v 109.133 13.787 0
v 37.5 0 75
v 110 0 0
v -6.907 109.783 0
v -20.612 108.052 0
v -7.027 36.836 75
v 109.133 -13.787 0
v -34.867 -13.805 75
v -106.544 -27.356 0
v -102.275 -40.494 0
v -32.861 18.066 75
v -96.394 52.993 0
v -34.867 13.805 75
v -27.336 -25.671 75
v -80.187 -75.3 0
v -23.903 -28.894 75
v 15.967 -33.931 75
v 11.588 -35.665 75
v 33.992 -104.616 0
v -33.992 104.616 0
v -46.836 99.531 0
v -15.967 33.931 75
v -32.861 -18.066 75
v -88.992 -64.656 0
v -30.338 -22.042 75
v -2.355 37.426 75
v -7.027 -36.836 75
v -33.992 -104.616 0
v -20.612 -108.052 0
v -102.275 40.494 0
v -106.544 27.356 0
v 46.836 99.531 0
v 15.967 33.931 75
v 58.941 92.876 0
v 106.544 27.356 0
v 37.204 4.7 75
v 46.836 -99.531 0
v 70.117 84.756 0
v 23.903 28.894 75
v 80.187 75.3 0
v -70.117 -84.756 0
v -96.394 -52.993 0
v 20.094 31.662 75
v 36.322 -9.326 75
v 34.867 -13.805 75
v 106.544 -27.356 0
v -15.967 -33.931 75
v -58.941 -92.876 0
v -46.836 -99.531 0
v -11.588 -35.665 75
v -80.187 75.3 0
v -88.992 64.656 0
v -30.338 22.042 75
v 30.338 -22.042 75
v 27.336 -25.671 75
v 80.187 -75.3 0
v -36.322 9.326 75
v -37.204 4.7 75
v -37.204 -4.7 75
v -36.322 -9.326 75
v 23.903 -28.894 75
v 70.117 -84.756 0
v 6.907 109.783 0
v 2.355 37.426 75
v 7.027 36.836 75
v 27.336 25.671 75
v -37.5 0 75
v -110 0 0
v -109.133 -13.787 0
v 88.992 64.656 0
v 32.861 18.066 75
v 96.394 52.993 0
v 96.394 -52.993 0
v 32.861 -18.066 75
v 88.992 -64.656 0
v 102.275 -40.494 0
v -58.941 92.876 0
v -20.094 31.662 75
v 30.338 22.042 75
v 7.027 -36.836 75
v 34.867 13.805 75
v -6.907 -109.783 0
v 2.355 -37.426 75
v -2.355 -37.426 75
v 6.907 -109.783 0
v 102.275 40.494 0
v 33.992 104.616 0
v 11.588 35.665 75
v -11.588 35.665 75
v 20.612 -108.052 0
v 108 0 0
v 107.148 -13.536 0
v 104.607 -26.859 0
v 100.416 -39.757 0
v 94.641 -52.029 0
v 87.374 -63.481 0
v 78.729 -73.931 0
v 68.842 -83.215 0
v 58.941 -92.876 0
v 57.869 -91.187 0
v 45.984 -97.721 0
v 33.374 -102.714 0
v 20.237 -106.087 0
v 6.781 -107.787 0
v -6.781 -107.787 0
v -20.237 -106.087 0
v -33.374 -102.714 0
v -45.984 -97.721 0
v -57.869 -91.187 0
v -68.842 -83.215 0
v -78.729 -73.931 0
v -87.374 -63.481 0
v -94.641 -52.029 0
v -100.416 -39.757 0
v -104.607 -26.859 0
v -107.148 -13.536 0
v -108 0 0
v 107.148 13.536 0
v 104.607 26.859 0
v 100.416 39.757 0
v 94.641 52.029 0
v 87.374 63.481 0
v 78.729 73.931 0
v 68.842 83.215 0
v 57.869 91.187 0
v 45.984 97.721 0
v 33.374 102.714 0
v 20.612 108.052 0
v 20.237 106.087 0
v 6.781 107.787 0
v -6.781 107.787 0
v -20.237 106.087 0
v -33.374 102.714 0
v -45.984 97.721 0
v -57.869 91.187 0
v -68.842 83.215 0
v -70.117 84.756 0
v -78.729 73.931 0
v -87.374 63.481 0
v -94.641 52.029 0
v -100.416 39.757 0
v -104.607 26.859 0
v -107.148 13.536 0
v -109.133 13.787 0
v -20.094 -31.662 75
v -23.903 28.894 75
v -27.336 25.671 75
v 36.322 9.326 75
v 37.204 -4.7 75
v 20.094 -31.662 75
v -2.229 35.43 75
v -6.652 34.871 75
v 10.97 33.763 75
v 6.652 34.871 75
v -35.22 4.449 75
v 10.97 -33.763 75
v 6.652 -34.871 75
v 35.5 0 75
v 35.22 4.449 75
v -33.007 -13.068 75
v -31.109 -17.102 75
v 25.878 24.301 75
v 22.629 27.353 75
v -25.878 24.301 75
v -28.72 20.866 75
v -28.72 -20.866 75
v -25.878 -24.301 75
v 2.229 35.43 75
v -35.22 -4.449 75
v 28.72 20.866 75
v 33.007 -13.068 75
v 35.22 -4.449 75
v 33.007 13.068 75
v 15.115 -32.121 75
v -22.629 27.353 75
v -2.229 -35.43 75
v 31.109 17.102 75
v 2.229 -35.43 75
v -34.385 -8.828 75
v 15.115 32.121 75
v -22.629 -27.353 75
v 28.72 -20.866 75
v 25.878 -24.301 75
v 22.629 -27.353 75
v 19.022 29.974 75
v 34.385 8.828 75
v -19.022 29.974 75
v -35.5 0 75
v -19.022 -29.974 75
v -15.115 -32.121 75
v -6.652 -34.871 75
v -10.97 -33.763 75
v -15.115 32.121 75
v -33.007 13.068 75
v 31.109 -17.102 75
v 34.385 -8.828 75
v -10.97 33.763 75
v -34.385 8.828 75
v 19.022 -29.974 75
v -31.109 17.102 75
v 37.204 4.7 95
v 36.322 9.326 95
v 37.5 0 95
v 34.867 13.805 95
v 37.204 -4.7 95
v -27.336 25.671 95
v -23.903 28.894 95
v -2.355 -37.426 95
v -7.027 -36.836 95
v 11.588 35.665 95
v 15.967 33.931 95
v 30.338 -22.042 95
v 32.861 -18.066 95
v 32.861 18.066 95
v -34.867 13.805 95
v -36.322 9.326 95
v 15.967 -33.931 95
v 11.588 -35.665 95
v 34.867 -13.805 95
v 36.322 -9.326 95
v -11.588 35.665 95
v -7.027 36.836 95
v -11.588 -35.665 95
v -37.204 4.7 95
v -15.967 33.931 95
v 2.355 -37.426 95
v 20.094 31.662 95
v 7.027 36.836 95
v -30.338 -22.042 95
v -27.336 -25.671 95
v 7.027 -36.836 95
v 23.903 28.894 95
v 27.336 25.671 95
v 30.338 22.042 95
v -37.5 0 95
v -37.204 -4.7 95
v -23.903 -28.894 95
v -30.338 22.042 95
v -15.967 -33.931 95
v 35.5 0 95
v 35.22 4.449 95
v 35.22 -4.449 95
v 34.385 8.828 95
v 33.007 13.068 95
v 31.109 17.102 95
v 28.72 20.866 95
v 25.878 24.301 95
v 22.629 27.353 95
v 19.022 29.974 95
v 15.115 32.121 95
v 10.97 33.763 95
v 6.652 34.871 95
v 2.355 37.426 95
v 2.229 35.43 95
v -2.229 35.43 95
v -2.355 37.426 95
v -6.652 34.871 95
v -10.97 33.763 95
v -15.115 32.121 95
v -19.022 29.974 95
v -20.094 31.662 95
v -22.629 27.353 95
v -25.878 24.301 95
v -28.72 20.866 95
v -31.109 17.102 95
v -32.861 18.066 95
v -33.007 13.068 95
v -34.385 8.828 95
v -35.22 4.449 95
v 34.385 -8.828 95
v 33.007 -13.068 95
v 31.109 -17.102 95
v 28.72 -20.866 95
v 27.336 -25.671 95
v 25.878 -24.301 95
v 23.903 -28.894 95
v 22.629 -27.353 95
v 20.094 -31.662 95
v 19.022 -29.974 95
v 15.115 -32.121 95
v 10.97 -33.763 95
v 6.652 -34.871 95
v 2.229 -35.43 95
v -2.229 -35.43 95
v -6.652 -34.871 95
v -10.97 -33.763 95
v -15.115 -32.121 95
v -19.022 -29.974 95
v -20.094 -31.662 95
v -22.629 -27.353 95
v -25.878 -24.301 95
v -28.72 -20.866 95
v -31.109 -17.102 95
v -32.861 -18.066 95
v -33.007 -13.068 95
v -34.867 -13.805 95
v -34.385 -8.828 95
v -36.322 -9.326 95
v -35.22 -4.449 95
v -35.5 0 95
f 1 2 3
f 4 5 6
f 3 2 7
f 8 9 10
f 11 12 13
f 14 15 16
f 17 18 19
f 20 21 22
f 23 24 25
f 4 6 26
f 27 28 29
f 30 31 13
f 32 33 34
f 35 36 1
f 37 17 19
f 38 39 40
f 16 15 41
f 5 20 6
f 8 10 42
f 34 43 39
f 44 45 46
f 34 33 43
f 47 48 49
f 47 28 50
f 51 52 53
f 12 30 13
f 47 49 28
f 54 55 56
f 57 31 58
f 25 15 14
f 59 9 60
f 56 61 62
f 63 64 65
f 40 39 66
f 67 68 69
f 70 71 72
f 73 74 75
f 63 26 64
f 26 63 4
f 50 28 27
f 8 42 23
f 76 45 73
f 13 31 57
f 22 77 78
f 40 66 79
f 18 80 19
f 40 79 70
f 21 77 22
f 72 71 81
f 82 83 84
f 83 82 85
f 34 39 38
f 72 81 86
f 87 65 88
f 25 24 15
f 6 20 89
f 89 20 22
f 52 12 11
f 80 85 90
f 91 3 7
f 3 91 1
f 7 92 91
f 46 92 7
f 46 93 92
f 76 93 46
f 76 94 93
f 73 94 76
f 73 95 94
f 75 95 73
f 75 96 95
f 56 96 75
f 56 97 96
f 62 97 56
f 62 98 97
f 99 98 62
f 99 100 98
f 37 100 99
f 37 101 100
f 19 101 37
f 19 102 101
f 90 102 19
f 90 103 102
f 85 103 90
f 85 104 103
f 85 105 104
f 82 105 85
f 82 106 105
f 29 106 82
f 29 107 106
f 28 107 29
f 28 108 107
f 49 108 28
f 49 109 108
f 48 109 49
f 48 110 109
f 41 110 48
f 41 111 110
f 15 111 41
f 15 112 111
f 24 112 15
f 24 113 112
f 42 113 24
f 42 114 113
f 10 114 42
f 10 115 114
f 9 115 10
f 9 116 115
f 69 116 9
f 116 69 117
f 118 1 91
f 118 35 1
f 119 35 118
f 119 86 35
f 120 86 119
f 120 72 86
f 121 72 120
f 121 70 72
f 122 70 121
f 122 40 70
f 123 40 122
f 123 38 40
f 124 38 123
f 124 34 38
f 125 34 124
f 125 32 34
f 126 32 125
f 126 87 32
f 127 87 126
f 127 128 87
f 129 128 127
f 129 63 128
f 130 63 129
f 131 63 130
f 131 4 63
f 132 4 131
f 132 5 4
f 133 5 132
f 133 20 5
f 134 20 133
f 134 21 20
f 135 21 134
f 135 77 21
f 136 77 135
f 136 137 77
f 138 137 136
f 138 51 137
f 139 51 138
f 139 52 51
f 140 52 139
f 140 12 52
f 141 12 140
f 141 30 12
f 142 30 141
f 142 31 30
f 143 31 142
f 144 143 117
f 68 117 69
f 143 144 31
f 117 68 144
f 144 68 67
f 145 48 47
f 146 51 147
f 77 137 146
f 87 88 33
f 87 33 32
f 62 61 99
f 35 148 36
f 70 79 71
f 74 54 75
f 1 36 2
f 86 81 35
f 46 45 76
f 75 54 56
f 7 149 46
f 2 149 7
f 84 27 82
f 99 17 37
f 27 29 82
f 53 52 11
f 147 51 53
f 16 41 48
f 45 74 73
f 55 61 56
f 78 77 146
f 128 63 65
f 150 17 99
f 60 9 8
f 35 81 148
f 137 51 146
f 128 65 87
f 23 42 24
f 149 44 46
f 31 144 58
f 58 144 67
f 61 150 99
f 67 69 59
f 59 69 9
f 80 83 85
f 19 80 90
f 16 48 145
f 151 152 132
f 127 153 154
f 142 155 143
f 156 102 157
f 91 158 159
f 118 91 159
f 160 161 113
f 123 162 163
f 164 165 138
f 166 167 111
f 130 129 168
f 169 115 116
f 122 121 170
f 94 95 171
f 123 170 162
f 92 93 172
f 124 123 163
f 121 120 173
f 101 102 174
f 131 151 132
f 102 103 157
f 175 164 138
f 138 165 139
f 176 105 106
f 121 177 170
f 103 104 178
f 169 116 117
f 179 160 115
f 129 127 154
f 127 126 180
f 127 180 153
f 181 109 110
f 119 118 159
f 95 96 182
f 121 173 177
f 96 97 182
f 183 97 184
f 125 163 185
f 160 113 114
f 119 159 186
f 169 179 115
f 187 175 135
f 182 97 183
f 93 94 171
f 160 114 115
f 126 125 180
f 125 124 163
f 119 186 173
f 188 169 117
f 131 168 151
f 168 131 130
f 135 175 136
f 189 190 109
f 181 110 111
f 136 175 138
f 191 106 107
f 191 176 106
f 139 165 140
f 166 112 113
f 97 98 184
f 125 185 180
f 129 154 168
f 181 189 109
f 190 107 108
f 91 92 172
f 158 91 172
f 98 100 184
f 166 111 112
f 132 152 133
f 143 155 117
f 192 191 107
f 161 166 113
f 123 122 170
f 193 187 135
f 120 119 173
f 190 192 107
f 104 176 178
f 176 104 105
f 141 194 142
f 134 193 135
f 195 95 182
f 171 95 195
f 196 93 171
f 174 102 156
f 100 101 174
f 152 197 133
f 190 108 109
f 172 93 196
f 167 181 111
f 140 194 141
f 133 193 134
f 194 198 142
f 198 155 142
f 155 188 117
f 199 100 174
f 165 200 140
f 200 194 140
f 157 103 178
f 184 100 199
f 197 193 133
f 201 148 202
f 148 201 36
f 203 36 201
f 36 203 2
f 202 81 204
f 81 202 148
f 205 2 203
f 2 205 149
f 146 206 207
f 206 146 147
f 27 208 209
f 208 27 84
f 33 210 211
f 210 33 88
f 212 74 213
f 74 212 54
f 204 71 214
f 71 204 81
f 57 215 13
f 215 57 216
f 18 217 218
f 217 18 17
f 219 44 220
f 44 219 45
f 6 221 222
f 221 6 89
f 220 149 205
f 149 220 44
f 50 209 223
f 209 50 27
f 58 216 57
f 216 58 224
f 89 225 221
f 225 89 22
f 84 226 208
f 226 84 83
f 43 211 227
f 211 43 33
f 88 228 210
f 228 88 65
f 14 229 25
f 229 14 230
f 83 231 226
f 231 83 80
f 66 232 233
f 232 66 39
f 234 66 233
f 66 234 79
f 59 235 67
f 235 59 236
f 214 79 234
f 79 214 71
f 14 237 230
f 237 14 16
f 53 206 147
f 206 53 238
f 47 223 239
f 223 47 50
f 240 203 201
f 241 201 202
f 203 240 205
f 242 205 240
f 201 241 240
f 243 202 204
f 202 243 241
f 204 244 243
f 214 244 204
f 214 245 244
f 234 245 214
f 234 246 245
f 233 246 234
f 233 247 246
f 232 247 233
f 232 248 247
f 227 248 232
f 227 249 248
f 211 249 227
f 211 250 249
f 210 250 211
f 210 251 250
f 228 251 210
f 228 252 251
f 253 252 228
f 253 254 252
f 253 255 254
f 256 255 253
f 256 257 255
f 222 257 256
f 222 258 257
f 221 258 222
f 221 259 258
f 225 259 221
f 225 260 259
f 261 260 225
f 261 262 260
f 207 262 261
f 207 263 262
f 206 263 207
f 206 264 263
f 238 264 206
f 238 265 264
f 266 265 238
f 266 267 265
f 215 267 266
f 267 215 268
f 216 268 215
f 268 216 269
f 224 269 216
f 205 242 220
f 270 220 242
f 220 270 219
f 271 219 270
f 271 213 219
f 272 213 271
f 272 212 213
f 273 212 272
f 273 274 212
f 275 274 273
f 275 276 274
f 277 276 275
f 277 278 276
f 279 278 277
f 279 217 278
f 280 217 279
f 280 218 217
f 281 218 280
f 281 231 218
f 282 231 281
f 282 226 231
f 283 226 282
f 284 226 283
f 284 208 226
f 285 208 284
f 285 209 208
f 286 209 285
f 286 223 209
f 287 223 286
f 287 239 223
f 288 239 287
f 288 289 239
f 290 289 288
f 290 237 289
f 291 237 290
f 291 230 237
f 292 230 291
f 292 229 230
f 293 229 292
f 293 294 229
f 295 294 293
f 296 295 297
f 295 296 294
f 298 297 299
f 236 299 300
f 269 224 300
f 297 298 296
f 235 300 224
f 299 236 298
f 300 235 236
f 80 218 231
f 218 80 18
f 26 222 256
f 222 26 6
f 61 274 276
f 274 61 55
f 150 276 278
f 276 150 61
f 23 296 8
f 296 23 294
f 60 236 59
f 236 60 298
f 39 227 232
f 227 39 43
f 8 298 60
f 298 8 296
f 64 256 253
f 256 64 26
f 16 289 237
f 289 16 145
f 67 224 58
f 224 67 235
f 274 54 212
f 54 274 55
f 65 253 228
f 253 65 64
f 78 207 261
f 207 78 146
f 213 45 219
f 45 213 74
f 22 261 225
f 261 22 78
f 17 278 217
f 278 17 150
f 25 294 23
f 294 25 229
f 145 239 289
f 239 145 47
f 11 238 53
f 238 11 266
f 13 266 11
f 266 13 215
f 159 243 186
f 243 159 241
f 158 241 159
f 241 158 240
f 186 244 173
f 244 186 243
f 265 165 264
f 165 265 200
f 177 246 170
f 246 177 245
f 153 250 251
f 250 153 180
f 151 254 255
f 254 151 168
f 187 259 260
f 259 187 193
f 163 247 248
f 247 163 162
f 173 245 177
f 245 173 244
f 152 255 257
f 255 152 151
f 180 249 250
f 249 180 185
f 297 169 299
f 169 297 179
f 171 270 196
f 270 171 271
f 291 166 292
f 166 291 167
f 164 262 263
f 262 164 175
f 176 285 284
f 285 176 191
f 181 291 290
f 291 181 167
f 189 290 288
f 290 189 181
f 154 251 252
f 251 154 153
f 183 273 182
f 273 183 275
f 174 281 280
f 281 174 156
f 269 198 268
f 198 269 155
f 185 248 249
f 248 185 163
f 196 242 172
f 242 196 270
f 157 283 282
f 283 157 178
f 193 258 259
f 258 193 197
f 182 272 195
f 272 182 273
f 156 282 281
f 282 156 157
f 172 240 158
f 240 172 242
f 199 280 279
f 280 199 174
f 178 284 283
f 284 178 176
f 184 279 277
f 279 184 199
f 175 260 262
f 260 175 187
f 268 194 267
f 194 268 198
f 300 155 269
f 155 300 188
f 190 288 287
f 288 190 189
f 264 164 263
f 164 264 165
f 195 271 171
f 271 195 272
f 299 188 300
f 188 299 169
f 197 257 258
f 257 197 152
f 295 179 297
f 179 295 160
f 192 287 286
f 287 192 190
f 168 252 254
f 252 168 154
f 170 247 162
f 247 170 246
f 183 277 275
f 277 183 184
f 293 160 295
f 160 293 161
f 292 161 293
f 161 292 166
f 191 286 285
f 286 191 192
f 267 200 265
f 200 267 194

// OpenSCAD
$fn = 50;


difference() {
	union() {
		translate(v = [0, 0, 0]) {
			rotate(a = [0, 0, 0]) {
				difference() {
					union() {
						cylinder(h = 75, r1 = 110.0000000000, r2 = 37.5000000000);
					}
					union() {
						cylinder(h = 75, r1 = 108.0000000000, r2 = 35.5000000000);
					}
				}
			}
		}
		translate(v = [0, 0, 75]) {
			rotate(a = [0, 0, 0]) {
				difference() {
					union() {
						cylinder(h = 20, r = 37.5000000000);
					}
					union() {
						cylinder(h = 20, r = 35.5000000000);
					}
				}
			}
		}
	}
	union();
}
